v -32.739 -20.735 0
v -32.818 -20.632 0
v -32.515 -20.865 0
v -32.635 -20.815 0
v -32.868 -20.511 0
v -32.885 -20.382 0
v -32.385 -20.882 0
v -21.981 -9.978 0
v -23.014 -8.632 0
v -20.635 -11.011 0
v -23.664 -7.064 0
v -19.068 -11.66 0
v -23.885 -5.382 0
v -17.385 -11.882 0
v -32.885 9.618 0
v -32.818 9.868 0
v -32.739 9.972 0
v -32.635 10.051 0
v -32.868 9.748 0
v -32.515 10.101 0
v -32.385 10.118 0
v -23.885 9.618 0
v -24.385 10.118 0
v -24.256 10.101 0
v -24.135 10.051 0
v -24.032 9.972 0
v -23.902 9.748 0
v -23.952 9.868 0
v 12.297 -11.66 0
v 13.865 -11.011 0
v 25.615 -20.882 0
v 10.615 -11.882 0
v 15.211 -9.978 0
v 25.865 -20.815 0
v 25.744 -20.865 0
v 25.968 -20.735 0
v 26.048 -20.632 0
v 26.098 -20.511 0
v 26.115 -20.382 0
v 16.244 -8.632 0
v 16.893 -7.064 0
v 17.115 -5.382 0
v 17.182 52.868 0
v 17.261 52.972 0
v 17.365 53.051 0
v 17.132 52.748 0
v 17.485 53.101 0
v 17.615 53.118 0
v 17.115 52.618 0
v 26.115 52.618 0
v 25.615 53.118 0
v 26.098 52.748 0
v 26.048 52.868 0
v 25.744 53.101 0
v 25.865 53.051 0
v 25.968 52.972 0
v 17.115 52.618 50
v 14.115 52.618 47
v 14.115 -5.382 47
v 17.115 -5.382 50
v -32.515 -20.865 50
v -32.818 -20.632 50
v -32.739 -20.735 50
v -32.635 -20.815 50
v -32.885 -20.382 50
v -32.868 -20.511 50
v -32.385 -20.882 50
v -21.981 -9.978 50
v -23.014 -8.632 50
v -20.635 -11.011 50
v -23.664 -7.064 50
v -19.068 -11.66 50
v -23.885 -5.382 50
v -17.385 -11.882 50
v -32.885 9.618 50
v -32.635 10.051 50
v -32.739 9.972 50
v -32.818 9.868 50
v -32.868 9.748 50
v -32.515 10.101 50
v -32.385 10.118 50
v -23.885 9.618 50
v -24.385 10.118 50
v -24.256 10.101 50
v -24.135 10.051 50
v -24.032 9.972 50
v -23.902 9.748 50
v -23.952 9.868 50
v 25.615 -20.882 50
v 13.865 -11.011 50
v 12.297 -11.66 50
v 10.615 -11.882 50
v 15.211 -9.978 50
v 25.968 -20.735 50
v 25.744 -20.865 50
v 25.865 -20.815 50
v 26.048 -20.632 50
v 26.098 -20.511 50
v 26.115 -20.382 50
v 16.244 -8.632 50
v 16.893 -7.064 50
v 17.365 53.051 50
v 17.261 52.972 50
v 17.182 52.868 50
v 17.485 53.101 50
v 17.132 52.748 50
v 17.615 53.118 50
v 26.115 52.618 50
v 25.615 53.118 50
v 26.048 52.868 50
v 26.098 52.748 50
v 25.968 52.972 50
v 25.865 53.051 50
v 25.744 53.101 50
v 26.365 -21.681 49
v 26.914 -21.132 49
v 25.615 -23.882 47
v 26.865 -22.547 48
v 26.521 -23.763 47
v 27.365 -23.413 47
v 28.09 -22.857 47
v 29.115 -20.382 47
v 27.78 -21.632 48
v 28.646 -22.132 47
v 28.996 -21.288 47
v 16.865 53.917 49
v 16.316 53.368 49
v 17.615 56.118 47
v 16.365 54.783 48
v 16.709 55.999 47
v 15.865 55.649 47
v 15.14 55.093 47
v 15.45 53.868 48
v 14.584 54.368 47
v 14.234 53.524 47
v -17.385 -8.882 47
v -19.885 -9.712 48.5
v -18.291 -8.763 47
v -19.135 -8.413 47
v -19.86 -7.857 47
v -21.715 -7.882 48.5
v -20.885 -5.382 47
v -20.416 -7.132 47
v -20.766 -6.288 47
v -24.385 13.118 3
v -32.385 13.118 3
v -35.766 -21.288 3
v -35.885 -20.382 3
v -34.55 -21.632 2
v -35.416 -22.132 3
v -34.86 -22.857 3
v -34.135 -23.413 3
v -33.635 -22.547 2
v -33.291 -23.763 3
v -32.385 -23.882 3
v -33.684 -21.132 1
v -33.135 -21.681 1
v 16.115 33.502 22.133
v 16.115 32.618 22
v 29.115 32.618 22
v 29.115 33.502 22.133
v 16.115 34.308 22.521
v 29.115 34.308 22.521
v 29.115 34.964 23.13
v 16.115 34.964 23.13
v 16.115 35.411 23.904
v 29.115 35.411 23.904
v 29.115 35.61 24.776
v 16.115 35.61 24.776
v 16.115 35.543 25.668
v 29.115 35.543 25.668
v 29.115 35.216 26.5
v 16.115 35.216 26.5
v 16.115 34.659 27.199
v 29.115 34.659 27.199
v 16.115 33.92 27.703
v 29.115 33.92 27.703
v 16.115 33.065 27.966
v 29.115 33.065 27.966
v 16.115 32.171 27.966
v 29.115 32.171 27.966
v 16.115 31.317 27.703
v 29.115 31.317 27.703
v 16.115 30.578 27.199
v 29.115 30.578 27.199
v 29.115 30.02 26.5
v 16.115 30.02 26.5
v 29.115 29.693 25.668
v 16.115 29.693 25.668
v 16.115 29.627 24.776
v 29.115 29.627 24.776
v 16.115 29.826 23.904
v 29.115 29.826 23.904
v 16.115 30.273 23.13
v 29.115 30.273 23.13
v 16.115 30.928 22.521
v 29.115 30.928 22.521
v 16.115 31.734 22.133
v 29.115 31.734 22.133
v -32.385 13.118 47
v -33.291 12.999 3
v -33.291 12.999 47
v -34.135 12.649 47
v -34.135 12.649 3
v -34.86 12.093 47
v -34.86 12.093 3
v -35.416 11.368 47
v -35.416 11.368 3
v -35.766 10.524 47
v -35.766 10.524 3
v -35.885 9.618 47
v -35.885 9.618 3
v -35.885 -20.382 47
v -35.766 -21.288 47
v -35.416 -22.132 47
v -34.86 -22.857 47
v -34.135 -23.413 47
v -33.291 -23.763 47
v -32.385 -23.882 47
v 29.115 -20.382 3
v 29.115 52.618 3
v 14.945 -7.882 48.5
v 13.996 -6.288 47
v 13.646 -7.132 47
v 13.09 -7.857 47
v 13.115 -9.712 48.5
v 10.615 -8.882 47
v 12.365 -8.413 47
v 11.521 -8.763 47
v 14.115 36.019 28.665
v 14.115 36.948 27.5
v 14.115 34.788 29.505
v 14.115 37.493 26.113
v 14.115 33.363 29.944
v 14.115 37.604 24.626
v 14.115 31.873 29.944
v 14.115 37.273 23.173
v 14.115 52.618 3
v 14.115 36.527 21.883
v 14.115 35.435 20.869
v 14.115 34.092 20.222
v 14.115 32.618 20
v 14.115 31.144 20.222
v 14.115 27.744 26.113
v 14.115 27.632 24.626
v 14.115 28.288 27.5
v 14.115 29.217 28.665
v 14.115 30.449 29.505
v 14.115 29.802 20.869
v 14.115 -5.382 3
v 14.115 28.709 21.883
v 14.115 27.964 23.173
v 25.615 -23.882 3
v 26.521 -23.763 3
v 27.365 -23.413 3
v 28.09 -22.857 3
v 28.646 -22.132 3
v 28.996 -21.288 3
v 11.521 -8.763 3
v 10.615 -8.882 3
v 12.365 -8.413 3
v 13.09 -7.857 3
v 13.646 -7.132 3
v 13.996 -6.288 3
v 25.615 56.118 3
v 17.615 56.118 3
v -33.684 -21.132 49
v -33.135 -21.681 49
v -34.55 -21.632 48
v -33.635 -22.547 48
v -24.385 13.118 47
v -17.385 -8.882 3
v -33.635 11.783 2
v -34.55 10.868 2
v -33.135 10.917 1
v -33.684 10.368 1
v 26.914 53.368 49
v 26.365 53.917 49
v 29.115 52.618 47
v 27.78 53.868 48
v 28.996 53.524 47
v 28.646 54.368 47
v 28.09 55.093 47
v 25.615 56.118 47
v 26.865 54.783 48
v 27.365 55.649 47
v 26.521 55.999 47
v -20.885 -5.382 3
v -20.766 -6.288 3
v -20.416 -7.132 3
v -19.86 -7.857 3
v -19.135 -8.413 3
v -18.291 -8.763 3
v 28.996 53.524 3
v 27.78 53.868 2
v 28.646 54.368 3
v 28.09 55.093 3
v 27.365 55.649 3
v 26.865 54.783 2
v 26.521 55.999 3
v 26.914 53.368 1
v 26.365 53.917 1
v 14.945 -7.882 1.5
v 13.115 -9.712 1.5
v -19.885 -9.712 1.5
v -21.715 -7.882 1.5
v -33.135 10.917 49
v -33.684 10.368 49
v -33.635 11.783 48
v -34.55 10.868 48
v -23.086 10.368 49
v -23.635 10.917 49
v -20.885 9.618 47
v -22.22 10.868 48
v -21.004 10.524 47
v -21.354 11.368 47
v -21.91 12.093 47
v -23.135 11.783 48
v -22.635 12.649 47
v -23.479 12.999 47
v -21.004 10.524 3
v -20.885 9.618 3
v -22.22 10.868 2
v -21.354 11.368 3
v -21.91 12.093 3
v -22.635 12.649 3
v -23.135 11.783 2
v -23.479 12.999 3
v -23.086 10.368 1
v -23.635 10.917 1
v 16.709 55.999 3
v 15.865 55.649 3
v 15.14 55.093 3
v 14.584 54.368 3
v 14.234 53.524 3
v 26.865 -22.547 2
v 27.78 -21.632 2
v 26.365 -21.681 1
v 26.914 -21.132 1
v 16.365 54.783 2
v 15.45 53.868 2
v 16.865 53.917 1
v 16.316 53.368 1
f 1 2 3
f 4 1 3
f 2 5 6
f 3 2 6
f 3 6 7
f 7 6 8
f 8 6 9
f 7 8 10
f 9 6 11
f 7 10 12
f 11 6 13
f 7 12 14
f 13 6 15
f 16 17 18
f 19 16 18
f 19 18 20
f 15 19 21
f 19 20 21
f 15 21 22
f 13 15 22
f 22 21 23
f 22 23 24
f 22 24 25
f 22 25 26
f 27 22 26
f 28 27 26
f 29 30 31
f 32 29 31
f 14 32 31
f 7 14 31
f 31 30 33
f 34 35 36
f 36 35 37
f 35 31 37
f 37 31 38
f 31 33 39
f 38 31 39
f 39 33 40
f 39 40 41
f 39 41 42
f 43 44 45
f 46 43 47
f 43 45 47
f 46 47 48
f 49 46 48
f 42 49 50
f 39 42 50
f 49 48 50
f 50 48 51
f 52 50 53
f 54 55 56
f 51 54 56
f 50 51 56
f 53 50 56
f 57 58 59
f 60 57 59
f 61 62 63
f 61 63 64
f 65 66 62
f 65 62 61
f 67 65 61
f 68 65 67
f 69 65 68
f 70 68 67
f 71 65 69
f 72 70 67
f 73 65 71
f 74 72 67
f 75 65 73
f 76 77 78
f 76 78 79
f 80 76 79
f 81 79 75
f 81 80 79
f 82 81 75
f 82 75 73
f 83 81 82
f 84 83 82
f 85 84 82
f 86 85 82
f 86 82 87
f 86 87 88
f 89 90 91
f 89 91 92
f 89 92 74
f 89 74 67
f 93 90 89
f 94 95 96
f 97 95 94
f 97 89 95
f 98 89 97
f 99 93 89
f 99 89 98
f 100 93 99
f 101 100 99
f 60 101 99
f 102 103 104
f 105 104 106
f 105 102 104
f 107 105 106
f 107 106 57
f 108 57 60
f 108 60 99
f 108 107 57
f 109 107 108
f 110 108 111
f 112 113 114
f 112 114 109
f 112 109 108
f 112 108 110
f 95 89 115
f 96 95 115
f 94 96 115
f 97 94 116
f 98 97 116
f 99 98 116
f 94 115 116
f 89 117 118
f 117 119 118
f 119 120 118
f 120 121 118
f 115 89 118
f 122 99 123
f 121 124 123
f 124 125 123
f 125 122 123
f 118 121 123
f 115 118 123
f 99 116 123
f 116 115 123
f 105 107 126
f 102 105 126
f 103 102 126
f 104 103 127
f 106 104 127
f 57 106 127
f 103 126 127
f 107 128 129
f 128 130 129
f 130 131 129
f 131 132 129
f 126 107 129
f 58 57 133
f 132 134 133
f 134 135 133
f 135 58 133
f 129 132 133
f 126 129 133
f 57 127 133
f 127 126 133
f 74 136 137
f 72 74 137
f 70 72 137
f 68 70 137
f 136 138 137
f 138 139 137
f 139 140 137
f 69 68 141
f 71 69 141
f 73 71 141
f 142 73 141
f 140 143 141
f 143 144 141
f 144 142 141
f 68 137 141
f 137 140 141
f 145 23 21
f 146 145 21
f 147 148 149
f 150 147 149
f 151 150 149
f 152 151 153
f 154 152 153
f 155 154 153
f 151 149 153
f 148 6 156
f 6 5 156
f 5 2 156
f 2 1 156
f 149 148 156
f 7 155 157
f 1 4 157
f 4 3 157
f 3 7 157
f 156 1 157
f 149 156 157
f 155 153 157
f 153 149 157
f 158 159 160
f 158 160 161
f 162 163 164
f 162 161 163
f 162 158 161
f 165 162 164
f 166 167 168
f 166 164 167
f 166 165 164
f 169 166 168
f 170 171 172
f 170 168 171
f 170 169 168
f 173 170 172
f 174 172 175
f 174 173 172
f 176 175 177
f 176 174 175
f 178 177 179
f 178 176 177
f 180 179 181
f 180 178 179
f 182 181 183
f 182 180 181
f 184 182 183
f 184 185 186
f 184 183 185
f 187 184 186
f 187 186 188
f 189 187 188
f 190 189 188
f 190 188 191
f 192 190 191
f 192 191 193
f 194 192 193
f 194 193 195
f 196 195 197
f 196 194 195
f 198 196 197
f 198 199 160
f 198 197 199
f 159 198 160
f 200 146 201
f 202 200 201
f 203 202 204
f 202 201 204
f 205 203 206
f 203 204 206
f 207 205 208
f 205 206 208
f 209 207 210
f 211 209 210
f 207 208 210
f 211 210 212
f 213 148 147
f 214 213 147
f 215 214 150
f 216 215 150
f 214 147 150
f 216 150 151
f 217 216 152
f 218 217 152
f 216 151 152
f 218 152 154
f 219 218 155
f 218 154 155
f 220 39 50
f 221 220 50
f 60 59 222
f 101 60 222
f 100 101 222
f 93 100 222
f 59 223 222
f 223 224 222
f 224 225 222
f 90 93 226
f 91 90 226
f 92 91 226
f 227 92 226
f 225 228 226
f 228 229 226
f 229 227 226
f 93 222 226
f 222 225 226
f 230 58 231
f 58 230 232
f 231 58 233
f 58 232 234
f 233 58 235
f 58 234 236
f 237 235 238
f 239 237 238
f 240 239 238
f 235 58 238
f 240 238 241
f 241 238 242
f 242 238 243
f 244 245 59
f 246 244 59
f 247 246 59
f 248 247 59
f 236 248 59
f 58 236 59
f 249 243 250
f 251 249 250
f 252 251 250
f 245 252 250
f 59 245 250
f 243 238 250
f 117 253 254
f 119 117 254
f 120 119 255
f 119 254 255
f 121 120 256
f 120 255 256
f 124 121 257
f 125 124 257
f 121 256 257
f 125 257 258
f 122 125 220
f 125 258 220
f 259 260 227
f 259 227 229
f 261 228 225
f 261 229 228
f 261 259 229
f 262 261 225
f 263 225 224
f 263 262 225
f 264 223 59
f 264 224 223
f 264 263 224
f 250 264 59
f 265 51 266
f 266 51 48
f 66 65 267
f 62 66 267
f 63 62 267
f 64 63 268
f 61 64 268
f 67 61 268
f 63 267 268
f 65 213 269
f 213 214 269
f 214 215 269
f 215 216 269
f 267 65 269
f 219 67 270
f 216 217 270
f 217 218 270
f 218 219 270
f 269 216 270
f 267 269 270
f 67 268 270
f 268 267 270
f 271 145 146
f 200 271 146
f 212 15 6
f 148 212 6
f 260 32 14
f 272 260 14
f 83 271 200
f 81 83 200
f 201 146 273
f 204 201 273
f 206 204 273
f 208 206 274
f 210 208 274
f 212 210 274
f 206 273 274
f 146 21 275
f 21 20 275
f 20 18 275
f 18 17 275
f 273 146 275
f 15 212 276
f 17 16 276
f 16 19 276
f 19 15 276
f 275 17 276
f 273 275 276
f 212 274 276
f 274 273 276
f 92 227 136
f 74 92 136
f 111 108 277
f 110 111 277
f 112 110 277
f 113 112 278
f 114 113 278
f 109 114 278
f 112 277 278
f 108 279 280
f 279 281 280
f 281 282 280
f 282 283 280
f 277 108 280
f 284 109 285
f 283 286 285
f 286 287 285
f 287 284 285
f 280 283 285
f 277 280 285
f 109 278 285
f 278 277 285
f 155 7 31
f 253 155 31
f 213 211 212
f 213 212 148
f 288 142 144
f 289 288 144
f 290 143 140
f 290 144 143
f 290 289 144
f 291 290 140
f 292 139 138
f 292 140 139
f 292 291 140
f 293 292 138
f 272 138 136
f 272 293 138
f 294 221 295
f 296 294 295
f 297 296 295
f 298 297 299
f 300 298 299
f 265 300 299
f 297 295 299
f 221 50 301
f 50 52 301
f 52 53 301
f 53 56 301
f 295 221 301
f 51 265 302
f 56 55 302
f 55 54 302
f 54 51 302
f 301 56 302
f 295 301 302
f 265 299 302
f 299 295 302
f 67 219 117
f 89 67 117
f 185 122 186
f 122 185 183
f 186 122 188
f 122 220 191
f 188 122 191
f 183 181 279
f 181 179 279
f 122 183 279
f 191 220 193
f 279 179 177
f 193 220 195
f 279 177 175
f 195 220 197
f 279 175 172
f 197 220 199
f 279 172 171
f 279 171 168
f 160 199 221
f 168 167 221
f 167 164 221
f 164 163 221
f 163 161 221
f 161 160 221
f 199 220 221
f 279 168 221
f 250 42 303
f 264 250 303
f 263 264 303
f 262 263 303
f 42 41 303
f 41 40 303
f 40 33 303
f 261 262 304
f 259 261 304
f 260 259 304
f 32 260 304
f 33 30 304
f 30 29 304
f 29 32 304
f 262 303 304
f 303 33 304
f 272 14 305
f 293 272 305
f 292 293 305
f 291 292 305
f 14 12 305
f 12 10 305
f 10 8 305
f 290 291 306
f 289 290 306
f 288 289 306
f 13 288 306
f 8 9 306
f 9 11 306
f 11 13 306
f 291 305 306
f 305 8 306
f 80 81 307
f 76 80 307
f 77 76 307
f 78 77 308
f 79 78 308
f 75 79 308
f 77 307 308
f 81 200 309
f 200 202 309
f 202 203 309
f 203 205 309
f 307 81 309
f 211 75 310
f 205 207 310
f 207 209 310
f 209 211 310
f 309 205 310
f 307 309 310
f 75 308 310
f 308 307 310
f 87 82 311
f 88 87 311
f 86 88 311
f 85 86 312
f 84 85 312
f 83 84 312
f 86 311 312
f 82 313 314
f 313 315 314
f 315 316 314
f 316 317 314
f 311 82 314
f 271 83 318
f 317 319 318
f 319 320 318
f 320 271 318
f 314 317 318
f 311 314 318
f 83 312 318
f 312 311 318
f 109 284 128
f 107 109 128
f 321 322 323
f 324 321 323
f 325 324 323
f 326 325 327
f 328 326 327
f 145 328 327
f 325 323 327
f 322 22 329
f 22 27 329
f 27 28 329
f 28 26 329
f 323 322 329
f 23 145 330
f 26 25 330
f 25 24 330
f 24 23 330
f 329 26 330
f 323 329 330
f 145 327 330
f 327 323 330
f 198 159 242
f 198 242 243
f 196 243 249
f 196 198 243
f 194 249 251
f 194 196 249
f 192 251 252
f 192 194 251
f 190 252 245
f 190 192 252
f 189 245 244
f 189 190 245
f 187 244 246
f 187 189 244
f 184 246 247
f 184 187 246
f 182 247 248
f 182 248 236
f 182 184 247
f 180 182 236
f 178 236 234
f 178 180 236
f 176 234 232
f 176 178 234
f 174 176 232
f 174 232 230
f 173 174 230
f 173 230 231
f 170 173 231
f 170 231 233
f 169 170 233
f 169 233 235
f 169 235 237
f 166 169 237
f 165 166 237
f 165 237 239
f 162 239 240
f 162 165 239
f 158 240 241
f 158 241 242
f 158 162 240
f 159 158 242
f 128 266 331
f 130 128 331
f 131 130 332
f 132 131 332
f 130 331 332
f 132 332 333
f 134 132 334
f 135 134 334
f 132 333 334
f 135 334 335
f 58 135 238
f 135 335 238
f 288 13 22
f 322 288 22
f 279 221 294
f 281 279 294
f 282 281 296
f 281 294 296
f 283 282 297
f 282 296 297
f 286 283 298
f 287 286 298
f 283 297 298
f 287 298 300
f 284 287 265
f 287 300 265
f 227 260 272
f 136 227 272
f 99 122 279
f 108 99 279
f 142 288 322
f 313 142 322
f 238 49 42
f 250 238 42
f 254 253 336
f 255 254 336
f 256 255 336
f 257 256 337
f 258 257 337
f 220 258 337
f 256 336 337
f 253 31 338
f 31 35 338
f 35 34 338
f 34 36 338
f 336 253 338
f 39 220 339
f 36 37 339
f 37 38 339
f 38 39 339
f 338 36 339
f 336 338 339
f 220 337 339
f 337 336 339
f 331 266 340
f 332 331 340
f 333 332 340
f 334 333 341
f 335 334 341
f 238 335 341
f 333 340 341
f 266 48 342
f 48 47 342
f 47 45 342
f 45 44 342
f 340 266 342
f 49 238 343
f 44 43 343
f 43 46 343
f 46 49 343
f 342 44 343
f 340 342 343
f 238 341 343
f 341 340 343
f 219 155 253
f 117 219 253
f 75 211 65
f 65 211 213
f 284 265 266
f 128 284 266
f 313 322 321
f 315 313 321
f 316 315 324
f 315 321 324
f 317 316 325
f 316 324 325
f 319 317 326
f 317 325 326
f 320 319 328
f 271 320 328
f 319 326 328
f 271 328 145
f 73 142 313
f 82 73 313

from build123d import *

# Parameters (mm, degrees)
PAD_DEPTH       = 50
CHAMFER_SIZE    = 3
CHAMFER001_SIZE = 3
SKETCH001_R     = 3
POCKET_DEPTH    = 15.11578
CHAMFER002_SIZE = 2


with BuildPart() as part:
    # Sketch → Pad (new body)
    with BuildSketch(Plane.XY):
        with BuildLine():
            Line((-35.88522, 9.618171), (-35.88522, -20.381829))
            ThreePointArc((-35.88522, -20.381829), (-34.860094, -22.856703), (-32.38522, -23.881829))
            Line((-32.38522, -23.881829), (25.61478, -23.881829))
            ThreePointArc((25.61478, -23.881829), (28.089653, -22.856703), (29.11478, -20.381829))
            Line((29.11478, -20.381829), (29.11478, 52.618171))
            ThreePointArc((29.11478, 52.618171), (28.089653, 55.093044), (25.61478, 56.118171))
            Line((25.61478, 56.118171), (17.61478, 56.118171))
            ThreePointArc((17.61478, 56.118171), (15.139906, 55.093044), (14.11478, 52.618171))
            Line((14.11478, 52.618171), (14.11478, -5.381829))
            ThreePointArc((10.61478, -8.881829), (13.089653, -7.856703), (14.11478, -5.381829))
            Line((10.61478, -8.881829), (-17.38522, -8.881829))
            ThreePointArc((-20.88522, -5.381829), (-19.860094, -7.856703), (-17.38522, -8.881829))
            Line((-20.88522, -5.381829), (-20.88522, 9.618171))
            ThreePointArc((-20.88522, 9.618171), (-21.910347, 12.093044), (-24.38522, 13.118171))
            Line((-24.38522, 13.118171), (-32.38522, 13.118171))
            ThreePointArc((-32.38522, 13.118171), (-34.860094, 12.093044), (-35.88522, 9.618171))
        make_face()
    extrude(amount=PAD_DEPTH)

    # Chamfer
    chamfer_edges = [part.edges().sort_by_distance(p)[0] for p in [
        (29.11478, 16.118171, 0),
    ]]
    chamfer(chamfer_edges, length=CHAMFER_SIZE)

    # Chamfer001
    chamfer001_edges = [part.edges().sort_by_distance(p)[0] for p in [
        (29.11478, 16.118171, 50),
    ]]
    chamfer(chamfer001_edges, length=CHAMFER001_SIZE)

    # Sketch001 (on DatumPlane) → Pocket (cut, through all)
    with BuildSketch(Plane(origin=(14, 0, 0), x_dir=(0, 0, -1), z_dir=(1, 0, 0))):
        with Locations((-25, 32.618171)):
            Circle(SKETCH001_R)
    extrude(amount=POCKET_DEPTH, mode=Mode.SUBTRACT)

    # Chamfer002
    chamfer002_edges = [part.edges().sort_by_distance(p)[0] for p in [
        (14.11478, 32.618171, 28),
    ]]
    chamfer(chamfer002_edges, length=CHAMFER002_SIZE)


solid = part.part
